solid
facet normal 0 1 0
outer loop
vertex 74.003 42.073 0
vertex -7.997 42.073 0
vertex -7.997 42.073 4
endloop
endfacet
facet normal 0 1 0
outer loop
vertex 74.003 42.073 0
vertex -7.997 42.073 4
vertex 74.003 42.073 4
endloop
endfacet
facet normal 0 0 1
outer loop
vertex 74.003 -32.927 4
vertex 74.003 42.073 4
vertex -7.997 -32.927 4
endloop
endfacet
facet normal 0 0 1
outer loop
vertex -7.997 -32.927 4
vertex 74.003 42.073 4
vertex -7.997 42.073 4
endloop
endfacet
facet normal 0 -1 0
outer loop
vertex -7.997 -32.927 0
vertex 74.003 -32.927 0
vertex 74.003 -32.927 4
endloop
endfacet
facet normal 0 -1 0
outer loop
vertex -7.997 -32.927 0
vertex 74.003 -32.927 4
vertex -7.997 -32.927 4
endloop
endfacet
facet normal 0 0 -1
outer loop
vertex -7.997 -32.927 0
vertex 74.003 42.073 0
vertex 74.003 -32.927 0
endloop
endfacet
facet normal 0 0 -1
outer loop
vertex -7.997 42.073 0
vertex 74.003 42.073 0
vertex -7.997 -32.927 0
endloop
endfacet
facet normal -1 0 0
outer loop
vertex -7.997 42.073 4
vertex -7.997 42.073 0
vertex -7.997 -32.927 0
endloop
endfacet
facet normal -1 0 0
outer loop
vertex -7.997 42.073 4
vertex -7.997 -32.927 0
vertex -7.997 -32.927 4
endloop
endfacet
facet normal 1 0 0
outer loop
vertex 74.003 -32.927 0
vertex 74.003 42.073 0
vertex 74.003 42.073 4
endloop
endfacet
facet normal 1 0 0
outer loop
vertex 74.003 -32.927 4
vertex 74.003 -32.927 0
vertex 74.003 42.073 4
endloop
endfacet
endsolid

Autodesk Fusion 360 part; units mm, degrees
sketch "Sketch1" plane through (0, 0, 0) normal (0, 0, 1) x (1, 0, 0)
  line L0 (-7.9973, 42.0732) -> (74.0027, 42.0732)
  line L1 (74.0027, 42.0732) -> (74.0027, -12.9268)
  line L2 (74.0027, -12.9268) -> (-7.9973, -12.9268)
  line L3 (-7.9973, -12.9268) -> (-7.9973, 42.0732)
extrude "Extrude1" add sketch "Sketch1" along normal blind 4
extrude "Extrude2" add 1 faces at (46.6694, -12.9268, 1.3333) along direction (0, -1, 0) blind 15
extrude "Extrude3" add 1 faces at (46.6694, -27.9268, 1.3333) along direction (0, -1, 0) blind 5
